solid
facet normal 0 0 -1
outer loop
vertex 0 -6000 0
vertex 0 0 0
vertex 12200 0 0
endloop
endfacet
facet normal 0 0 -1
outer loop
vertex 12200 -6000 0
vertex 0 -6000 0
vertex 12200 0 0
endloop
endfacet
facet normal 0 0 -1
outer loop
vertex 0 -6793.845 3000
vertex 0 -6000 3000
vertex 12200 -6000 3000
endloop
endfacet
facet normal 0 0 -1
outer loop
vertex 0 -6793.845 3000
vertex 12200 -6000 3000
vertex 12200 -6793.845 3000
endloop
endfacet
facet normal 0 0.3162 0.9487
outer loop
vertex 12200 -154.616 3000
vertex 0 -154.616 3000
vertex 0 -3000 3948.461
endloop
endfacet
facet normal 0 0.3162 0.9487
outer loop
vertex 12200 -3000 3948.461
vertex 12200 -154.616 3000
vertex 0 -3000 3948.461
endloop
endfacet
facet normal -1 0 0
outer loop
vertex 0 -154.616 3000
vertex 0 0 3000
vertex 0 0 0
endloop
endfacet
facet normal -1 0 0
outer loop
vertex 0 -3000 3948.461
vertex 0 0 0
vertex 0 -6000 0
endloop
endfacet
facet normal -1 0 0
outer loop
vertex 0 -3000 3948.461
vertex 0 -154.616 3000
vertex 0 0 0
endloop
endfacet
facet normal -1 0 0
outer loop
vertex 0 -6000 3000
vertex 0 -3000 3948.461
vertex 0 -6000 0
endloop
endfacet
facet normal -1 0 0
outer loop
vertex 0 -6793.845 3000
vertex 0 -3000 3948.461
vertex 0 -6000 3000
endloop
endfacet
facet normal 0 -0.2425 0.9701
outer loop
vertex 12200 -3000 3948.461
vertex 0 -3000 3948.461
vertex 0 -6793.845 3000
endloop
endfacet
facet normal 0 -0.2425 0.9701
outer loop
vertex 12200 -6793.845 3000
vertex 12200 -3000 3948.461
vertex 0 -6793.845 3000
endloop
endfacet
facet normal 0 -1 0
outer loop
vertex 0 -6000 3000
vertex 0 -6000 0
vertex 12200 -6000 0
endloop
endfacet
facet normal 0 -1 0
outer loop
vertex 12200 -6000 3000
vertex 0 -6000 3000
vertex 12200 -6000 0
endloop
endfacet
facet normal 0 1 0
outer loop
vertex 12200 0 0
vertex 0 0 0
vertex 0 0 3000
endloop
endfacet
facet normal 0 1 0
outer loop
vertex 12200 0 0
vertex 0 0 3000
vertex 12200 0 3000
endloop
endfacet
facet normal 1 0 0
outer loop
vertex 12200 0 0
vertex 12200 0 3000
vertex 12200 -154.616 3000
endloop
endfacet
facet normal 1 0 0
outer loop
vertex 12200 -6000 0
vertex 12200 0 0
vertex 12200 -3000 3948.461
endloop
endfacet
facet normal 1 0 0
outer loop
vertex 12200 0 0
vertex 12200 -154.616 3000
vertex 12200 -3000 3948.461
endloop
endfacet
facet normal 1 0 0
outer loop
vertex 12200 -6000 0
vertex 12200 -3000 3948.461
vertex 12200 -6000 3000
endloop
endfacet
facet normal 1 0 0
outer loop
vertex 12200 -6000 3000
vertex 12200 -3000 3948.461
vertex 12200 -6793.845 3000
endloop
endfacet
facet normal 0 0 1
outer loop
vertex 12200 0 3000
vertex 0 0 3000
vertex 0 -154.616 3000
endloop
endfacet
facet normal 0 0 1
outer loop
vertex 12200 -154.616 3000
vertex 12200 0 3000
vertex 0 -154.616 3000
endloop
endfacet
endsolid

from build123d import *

# Parameters (mm, degrees)
F0_W     = 12200
F0_H     = 6000
F1_DEPTH = 3000
F3_DEPTH = 12200
F5_DEPTH = 12200


with BuildPart() as f1:
    # F0 (on Top) → F1 (new body)
    with BuildSketch(Plane.XY):
        with Locations((6100, -3000)):
            Rectangle(F0_W, F0_H)
    extrude(amount=F1_DEPTH)

    # F2 (on face) → F3 (join)
    with BuildSketch(Plane(origin=(0, 0, 0), x_dir=(0, -1, 0), z_dir=(-1, 0, 0))):
        Polygon((3000, 4000), (0, 3000), (7000, 3000), align=None)
    extrude(amount=-F3_DEPTH)

    # F4 (on face) → F5 (cut)
    with BuildSketch(Plane(origin=(0, 0, 0), x_dir=(0, -1, 0), z_dir=(-1, 0, 0))):
        Polygon((3000, 4000), (0, 3000), (154.616461, 3000), (3000, 3948.46118), (6793.844719, 3000), (7000, 3000), align=None)
    extrude(amount=-F5_DEPTH, mode=Mode.SUBTRACT)


solid = f1.part
